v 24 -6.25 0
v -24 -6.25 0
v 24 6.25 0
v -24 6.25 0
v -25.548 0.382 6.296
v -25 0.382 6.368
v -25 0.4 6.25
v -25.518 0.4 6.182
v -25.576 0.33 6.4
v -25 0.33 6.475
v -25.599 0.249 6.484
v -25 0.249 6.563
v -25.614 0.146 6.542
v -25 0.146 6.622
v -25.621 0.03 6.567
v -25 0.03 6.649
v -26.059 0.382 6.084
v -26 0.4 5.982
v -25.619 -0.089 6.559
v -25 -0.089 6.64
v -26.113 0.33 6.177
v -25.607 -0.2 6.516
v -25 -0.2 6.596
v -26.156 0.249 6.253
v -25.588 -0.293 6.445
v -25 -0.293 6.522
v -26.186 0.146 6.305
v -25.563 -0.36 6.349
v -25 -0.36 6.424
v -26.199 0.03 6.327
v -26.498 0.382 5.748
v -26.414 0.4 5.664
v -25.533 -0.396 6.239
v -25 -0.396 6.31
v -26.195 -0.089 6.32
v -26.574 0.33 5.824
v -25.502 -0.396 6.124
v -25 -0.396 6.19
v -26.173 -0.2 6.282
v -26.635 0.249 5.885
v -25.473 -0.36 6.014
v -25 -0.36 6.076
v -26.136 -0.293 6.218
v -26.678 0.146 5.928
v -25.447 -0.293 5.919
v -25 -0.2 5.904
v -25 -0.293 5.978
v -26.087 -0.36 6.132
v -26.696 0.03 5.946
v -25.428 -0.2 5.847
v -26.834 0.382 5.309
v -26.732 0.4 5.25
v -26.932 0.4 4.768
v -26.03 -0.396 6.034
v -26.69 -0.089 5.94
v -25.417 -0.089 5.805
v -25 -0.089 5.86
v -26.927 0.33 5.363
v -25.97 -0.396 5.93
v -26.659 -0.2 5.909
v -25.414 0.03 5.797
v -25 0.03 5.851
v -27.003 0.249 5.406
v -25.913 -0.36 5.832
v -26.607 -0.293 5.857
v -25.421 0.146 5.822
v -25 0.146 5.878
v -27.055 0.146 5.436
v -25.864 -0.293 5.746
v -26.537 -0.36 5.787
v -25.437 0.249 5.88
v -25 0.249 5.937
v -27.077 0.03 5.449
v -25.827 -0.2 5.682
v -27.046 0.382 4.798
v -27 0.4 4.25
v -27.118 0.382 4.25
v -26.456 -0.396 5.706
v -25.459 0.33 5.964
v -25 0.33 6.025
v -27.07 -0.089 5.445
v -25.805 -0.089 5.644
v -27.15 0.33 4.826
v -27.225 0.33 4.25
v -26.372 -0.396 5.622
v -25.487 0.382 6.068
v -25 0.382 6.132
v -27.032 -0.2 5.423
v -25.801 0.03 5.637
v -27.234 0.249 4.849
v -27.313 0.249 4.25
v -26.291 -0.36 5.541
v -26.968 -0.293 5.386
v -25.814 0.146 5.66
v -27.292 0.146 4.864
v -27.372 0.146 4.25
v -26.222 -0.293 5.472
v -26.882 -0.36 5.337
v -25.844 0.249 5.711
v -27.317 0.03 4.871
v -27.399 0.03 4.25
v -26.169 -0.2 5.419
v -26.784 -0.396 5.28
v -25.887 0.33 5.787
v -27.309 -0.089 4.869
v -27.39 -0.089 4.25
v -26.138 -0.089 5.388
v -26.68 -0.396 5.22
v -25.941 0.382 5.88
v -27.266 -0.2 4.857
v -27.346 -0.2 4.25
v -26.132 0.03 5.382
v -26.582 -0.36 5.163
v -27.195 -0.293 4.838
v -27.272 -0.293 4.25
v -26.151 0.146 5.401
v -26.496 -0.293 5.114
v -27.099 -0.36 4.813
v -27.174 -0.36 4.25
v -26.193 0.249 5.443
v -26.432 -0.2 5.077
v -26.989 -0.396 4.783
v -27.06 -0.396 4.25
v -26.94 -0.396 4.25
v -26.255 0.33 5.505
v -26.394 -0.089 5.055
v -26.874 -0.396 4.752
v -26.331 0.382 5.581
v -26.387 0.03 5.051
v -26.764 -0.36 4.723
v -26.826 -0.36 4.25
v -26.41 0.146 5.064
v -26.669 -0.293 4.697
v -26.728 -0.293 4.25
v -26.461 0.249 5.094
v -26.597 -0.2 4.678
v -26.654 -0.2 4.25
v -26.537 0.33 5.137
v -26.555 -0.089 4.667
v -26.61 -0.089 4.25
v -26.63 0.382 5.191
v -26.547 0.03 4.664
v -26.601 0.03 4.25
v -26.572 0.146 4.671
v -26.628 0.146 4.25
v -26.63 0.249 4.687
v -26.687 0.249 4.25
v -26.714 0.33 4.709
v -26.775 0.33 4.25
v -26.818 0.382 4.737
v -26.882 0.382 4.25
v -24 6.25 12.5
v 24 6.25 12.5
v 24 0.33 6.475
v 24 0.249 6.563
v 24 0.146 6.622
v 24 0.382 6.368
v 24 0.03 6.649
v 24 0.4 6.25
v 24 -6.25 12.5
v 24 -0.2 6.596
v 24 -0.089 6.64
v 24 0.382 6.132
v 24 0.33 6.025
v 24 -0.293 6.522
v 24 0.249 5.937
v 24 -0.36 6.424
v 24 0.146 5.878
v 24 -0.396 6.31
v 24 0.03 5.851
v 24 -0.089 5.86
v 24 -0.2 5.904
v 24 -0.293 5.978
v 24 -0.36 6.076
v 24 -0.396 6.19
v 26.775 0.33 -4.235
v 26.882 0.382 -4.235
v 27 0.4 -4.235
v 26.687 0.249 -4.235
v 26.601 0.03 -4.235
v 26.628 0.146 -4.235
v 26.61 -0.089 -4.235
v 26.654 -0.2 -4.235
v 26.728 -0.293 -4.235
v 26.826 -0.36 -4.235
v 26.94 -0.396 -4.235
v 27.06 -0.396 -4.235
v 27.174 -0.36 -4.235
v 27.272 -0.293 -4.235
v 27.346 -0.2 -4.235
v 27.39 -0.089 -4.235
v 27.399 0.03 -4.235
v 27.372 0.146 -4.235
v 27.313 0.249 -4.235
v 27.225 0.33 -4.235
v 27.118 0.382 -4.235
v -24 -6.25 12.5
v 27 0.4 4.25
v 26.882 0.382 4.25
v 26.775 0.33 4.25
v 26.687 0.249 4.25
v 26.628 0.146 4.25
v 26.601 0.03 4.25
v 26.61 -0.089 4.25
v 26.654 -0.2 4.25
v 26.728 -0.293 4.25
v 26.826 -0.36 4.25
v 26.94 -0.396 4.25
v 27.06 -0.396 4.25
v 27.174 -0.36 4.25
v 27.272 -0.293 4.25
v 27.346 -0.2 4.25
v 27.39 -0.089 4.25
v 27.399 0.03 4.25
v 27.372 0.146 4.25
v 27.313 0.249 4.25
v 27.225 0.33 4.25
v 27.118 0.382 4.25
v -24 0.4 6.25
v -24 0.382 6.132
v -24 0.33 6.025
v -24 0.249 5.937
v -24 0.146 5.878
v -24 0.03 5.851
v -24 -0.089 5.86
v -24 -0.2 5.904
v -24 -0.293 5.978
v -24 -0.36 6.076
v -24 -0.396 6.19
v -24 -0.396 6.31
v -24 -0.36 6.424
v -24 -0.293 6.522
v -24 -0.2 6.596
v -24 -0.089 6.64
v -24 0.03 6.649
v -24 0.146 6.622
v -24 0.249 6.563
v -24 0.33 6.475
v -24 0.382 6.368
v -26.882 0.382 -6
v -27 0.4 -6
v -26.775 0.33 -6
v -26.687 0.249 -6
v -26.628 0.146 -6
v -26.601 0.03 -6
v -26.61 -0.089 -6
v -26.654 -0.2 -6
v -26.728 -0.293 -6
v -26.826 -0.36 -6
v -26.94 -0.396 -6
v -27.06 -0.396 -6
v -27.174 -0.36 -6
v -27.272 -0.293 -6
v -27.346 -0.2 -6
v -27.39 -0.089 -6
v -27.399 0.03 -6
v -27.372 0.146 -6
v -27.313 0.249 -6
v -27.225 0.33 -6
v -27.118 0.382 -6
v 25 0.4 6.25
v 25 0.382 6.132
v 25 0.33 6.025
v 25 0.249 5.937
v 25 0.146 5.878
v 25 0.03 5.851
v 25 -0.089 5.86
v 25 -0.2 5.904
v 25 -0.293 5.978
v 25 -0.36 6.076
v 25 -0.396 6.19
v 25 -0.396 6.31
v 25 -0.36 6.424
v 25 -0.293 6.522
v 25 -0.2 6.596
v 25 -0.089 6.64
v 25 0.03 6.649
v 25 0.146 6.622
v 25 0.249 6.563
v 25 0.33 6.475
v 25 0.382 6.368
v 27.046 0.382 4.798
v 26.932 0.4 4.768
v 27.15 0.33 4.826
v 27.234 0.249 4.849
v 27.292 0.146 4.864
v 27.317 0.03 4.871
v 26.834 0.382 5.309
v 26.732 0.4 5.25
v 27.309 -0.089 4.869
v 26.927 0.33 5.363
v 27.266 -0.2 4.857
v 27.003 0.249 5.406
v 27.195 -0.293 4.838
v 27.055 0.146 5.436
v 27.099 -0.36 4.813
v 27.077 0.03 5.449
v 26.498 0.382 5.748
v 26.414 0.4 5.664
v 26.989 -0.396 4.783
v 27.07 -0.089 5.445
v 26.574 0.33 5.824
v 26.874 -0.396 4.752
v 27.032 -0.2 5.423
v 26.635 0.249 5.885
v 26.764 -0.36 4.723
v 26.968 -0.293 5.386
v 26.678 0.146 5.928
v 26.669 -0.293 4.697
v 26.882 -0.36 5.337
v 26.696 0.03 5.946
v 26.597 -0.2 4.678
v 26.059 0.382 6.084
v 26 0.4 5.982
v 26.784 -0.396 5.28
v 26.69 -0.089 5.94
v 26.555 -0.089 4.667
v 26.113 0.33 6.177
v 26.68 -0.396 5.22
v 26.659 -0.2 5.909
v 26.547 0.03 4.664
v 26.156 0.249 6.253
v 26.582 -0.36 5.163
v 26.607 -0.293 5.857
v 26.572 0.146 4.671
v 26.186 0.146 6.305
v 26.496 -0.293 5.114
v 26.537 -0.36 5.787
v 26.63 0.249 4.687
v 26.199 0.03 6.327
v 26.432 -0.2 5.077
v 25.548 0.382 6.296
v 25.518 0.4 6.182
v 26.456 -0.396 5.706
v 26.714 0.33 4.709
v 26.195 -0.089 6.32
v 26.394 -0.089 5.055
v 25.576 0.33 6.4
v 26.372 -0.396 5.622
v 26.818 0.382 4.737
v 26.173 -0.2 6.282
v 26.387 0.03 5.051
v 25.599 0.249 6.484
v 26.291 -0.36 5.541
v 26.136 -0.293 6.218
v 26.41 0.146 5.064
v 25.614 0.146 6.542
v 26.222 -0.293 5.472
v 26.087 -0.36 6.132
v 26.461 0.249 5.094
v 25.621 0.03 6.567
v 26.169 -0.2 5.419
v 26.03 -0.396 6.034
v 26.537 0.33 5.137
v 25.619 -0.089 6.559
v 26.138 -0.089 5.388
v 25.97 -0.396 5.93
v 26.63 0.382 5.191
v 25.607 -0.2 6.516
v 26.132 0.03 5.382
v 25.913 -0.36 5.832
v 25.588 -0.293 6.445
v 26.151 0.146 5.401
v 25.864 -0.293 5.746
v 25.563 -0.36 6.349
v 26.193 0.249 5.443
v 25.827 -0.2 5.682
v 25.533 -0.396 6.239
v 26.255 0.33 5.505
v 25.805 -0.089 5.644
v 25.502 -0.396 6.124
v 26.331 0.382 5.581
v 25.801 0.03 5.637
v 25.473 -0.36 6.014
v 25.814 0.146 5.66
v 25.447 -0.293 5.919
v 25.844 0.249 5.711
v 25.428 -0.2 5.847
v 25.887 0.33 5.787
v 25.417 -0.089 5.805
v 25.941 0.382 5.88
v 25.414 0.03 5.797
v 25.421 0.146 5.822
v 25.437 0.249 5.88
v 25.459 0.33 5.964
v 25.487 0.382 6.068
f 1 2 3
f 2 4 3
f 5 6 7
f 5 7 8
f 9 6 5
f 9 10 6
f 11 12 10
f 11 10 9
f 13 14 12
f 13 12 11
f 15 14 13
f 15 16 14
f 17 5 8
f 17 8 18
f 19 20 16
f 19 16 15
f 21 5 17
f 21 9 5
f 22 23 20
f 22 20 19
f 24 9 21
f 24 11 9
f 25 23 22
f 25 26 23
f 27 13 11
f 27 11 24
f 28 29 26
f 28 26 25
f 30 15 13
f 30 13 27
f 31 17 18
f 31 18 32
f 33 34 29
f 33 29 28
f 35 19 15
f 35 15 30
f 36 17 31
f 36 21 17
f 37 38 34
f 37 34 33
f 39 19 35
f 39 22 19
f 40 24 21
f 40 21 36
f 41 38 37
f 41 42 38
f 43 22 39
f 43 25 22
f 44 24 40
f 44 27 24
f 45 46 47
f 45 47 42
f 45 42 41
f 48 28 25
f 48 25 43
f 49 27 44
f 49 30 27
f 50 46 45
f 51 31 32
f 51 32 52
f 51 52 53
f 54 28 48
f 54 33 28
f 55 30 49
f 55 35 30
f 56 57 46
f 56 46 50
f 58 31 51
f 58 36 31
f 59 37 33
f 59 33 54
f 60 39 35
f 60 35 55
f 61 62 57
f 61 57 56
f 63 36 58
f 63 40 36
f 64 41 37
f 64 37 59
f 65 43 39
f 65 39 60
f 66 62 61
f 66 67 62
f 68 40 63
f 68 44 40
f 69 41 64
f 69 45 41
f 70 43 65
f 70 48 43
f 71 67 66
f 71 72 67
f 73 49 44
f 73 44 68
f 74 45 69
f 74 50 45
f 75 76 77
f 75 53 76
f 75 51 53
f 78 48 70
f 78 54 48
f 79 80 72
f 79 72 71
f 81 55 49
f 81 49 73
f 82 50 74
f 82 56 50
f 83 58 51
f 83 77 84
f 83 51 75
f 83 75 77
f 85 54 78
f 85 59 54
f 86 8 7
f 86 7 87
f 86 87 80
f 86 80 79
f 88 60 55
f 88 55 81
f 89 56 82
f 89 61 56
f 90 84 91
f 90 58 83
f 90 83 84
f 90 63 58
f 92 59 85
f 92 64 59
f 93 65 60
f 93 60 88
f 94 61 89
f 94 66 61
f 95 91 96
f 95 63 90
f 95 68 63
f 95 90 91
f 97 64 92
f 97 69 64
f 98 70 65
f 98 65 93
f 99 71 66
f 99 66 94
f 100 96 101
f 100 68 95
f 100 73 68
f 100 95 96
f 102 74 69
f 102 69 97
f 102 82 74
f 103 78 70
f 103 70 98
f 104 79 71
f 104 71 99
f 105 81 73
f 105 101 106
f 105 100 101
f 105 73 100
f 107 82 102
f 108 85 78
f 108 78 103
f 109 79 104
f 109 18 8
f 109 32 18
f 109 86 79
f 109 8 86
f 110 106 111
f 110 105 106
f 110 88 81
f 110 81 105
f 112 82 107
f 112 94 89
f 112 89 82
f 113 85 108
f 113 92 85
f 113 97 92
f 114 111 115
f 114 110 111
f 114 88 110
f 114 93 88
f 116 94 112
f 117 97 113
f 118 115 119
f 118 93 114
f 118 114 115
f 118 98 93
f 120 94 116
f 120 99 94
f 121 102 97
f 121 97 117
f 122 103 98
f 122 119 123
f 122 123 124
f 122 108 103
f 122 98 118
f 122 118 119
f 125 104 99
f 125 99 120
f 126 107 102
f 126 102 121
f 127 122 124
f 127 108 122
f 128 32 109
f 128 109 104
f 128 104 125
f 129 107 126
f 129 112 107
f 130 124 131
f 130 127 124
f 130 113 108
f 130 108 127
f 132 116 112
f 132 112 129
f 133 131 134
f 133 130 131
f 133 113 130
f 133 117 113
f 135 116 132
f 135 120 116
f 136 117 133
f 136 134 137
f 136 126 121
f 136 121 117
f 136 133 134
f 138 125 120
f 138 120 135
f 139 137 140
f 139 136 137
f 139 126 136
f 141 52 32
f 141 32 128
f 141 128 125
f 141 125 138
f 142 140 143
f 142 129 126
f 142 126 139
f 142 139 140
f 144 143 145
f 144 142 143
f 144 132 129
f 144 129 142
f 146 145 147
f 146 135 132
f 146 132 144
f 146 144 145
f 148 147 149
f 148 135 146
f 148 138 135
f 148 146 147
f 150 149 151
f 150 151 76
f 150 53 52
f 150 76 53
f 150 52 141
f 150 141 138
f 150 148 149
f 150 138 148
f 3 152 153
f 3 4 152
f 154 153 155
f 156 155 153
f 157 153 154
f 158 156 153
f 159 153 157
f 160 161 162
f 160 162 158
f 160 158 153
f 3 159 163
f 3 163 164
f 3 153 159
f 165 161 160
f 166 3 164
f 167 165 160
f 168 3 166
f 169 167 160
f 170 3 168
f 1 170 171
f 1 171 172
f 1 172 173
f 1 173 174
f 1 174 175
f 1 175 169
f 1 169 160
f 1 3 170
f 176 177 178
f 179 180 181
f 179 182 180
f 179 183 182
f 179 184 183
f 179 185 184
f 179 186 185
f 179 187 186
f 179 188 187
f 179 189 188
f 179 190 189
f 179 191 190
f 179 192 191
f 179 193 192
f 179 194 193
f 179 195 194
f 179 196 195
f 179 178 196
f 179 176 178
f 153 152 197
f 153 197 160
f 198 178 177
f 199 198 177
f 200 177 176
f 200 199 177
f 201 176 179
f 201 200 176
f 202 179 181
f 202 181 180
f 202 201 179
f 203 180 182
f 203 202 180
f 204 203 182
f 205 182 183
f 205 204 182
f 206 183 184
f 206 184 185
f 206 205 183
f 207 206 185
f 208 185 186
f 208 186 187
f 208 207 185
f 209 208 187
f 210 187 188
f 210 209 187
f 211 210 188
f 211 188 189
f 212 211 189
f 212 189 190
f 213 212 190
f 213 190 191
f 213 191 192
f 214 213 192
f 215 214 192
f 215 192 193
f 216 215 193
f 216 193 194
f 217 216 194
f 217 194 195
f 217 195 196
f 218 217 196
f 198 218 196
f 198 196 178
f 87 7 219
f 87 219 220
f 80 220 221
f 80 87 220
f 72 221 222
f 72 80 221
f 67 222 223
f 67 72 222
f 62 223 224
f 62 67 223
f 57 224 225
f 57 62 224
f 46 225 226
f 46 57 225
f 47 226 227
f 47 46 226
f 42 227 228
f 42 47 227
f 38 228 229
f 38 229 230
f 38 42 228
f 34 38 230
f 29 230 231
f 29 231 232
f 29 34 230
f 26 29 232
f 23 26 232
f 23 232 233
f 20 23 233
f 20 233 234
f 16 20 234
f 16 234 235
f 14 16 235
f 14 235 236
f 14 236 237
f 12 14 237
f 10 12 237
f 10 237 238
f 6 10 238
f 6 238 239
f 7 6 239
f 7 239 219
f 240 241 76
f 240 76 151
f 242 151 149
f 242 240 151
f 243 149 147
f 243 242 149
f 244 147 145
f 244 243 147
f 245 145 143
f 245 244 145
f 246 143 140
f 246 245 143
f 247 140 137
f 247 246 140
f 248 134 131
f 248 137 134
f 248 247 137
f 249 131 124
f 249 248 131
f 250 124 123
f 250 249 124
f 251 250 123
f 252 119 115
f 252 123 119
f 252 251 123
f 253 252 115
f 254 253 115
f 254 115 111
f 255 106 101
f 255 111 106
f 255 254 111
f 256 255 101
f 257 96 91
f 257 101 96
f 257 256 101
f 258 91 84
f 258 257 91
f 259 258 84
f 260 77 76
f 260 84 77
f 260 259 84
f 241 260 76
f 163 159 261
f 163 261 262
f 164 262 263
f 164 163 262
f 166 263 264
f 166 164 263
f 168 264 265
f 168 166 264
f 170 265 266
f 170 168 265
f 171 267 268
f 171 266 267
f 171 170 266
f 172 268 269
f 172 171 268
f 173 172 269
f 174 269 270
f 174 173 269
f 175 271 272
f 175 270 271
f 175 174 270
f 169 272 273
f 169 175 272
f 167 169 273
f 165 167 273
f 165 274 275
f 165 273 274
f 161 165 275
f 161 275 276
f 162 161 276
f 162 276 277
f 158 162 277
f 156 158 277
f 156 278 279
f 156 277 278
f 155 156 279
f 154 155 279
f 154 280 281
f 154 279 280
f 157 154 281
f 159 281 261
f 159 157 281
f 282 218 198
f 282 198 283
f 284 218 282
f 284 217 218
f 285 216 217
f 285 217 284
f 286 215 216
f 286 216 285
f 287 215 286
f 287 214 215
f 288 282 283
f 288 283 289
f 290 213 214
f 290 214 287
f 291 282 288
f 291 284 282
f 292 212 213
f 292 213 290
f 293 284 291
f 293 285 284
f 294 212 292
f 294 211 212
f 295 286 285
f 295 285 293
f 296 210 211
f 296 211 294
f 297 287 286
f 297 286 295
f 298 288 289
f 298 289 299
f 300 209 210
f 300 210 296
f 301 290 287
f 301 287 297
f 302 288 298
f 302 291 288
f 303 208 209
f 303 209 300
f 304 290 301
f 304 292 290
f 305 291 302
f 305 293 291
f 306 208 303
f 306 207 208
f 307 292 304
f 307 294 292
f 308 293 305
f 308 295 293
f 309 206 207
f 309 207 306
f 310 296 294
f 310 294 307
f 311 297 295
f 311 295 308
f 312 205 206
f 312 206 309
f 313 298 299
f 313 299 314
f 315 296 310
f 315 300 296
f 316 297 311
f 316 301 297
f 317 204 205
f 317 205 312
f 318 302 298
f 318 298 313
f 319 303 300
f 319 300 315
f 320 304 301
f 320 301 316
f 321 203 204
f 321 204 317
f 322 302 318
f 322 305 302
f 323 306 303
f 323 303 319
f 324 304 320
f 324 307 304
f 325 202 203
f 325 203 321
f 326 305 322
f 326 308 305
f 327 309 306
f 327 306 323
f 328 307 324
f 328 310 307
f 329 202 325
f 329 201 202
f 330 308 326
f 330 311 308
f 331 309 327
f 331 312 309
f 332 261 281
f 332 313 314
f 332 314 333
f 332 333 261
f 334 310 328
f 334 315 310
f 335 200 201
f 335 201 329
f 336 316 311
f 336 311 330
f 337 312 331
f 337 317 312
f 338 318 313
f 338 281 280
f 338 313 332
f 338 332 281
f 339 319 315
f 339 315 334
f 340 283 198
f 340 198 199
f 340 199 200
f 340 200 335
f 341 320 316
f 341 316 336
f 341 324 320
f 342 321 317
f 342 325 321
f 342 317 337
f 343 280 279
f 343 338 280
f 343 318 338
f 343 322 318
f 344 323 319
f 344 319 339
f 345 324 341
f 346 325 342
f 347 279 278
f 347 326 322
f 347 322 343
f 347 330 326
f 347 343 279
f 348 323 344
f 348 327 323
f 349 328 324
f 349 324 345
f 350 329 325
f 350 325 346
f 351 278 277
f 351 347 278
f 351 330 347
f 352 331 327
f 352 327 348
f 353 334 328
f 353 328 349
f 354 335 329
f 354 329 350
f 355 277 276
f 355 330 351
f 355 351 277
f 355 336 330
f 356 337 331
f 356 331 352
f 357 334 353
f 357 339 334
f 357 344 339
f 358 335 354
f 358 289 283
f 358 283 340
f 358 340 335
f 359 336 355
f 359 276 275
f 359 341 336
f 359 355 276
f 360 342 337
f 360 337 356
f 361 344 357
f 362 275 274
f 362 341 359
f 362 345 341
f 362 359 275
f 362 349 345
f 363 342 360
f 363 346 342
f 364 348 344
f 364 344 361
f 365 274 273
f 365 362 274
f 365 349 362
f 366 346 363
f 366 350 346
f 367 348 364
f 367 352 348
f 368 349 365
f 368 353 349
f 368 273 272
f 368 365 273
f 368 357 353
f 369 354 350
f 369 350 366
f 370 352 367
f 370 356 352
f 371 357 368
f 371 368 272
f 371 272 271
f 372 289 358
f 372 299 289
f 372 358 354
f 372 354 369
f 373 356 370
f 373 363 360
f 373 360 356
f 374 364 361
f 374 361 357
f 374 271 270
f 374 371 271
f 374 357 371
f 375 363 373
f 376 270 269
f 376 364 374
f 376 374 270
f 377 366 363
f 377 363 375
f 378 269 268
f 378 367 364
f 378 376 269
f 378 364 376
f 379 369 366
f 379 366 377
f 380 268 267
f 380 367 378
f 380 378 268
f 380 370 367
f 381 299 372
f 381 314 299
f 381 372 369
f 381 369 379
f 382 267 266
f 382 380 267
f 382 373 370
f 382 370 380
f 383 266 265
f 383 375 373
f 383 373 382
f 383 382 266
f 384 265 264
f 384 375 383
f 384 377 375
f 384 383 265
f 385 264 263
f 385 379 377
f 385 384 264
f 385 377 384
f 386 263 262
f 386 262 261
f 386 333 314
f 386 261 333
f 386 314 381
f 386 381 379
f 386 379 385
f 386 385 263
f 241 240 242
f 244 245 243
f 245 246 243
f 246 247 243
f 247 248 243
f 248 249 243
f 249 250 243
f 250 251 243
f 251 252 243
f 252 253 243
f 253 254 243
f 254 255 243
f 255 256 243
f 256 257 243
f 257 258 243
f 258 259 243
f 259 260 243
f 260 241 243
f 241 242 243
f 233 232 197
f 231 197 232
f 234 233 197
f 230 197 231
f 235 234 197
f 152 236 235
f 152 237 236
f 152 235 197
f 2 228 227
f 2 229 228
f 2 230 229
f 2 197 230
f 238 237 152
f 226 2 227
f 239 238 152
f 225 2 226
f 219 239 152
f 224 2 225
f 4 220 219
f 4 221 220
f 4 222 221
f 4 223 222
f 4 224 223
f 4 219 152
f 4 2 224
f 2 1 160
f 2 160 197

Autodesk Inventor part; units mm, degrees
ref_plane "YZ Plane" through (0, 0, 0) normal (1, 0, 0) x (0, 1, 0)
ref_plane "XZ Plane" through (0, 0, 0) normal (0, 1, 0) x (-1, 0, 0)
ref_plane "XY Plane" through (0, 0, 0) normal (0, 0, 1) x (1, 0, 0)
sketch "Boceto39" plane through (0, 0, 0) normal (0, 0, 1) x (1, 0, 0)
  line L0 (-24, 6.25) -> (24, 6.25)
  line L1 (24, 6.25) -> (24, -6.25)
  line L2 (24, -6.25) -> (-24, -6.25)
  line L3 (-24, -6.25) -> (-24, 6.25)
  point P0 (0, 0)
  point P1 (0, 6.25)
  point P2 (-24, 0)
  dimension "d373" = 48
  dimension "d374" = 12.5
extrude "Extrusión13" add sketch "Boceto39" along normal blind 12.5
sketch "Boceto40" plane through (0, 0, 0) normal (0, 1, 0) x (-1, 0, 0)
  line L0 (24, 0) -> (-24, 0) projected
  line L1 (24, 0) -> (24, 12.5) projected
  line L2 (-24, 12.5) -> (24, 12.5) projected
  line L3 (-24, 0) -> (-24, 12.5) projected
  line L4 (-27, -4.2347) -> (-27, 4.25)
  line L5 (-25, 6.25) -> (25, 6.25)
  line L6 (27, 4.25) -> (27, -6)
  arc A0 (27, 4.25) -> (25, 6.25) centre (25, 4.25) ccw
  arc A1 (-25, 6.25) -> (-27, 4.25) centre (-25, 4.25) ccw
  point P0 (0, 0)
  point P1 (0, 6.25)
  point P2 (24, 6.25)
  point P3 (0, 0)
  dimension "d377" = 27
  dimension "d378" = 2
  dimension "d379" = 6
sketch "Boceto41" plane through (0, 0, 0) normal (1, 0, 0) x (0, 1, 0)
  circle A0 centre (0, 6.25) radius 0.4
  point P0 (0, 0)
  dimension "d380" = 0.8
sweep "Barrido1" add profiles "Boceto41" path "Boceto40" path curves L6 A0 L5 A1 L4
properties part number "AXIAL-POWER-5W"
